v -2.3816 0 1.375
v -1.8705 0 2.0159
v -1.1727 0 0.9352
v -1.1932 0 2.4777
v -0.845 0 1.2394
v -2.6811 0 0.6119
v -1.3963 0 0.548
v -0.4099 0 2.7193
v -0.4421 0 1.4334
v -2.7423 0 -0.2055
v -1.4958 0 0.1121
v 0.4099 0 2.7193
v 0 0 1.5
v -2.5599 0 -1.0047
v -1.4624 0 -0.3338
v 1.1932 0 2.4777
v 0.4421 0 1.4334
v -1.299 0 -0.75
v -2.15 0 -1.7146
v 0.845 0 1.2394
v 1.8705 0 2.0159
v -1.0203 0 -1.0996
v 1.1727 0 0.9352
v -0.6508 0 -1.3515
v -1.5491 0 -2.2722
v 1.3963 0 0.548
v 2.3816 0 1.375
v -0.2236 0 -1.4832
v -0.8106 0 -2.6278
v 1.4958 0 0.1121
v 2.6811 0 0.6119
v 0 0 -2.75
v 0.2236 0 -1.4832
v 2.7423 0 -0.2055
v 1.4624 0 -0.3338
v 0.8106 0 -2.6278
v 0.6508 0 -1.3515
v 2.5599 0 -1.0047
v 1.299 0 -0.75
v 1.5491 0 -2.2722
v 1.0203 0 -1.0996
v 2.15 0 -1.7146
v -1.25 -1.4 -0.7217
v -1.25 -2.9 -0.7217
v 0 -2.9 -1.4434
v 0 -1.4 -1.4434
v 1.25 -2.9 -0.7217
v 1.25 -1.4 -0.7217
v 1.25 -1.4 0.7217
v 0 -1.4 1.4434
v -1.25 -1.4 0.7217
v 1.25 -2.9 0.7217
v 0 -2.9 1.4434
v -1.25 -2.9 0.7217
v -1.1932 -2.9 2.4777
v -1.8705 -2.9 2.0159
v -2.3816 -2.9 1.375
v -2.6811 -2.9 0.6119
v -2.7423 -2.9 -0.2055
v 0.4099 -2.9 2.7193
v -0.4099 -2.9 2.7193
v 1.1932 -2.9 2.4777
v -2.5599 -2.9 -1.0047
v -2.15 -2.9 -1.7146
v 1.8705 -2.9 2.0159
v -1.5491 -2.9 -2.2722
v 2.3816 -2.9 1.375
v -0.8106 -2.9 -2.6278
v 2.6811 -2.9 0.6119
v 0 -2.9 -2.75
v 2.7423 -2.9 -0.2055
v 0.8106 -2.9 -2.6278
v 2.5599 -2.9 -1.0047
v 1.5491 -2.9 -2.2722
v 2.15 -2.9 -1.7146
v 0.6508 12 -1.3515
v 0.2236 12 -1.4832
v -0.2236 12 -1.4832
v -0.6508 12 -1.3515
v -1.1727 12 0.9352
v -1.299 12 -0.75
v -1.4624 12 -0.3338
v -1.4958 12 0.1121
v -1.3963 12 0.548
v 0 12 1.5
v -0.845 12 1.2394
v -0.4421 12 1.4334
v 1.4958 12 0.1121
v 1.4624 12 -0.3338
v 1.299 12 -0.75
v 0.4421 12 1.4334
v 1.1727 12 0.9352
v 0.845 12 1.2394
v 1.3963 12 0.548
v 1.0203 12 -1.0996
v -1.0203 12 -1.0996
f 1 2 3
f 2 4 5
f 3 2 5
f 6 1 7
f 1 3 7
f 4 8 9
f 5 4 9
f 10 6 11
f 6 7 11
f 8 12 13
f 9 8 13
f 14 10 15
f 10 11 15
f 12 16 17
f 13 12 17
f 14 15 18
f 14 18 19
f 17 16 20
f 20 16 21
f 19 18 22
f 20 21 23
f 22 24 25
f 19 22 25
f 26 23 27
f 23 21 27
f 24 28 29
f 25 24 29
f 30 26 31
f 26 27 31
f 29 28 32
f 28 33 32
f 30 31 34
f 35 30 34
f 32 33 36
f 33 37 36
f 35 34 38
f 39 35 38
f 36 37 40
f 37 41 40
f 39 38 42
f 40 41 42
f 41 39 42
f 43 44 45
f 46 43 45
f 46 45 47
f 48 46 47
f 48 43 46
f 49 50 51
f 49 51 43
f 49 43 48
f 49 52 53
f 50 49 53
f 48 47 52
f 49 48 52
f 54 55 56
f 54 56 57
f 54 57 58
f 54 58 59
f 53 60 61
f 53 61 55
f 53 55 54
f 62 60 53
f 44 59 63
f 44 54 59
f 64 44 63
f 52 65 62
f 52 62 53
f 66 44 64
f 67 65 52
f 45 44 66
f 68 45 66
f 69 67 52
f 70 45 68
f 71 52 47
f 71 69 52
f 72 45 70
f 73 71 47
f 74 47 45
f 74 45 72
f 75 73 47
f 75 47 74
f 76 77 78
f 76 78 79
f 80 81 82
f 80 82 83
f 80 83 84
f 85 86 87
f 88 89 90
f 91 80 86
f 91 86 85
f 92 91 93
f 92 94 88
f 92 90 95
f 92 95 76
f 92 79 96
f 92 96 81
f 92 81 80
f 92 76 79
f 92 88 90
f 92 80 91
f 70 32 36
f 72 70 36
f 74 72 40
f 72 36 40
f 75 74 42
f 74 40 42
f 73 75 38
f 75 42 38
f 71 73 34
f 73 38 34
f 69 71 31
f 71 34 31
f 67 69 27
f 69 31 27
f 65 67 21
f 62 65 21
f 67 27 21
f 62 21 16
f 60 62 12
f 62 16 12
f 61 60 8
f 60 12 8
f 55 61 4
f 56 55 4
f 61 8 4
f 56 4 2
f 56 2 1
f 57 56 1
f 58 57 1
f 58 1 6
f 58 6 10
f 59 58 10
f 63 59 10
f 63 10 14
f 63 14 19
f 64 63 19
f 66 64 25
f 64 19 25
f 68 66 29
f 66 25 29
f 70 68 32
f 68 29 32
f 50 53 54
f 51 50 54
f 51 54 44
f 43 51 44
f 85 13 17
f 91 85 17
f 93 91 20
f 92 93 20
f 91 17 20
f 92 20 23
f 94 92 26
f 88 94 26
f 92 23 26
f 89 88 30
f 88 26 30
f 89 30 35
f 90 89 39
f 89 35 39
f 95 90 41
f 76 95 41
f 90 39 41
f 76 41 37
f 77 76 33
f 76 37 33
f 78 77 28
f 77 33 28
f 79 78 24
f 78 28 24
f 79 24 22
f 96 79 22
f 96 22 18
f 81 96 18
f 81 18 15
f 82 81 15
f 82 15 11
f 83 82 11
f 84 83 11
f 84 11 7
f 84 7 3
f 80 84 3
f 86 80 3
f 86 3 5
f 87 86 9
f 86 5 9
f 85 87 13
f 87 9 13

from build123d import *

# Parameters (mm, degrees)
SKETCH_1_R          = 1.5
EXTRUDE_1_DEPTH     = 12
SKETCH_2_R          = 2.75
EXTRUDE_2_DEPTH     = 2.9
CUT_EXTRUDE_1_DEPTH = 1.5


with BuildPart() as part:
    # 草图1 → 凸台-拉伸1 (new body)
    with BuildSketch(Plane(origin=(0, 0, 0), x_dir=(1, 0, 0), z_dir=(0, 1, 0))):
        with Locations(Location((0, 0, 0), (0, 0, 270))):
            Circle(SKETCH_1_R)
    extrude(amount=EXTRUDE_1_DEPTH)

    # 草图2 → 凸台-拉伸2 (add)
    with BuildSketch(Plane.XZ):
        with Locations(Location((0, 0, 0), (0, 0, 270))):
            Circle(SKETCH_2_R)
    extrude(amount=EXTRUDE_2_DEPTH)

    # 草图3 → 切除-拉伸1 (cut)
    with BuildSketch(Plane.XZ.offset(2.9)):
        Polygon((1.25, 0.721687836), (0, 1.443375673), (-1.25, 0.721687836), (-1.25, -0.721687836), (0, -1.443375673), (1.25, -0.721687836), align=None)
    extrude(amount=-CUT_EXTRUDE_1_DEPTH, mode=Mode.SUBTRACT)


solid = part.part
